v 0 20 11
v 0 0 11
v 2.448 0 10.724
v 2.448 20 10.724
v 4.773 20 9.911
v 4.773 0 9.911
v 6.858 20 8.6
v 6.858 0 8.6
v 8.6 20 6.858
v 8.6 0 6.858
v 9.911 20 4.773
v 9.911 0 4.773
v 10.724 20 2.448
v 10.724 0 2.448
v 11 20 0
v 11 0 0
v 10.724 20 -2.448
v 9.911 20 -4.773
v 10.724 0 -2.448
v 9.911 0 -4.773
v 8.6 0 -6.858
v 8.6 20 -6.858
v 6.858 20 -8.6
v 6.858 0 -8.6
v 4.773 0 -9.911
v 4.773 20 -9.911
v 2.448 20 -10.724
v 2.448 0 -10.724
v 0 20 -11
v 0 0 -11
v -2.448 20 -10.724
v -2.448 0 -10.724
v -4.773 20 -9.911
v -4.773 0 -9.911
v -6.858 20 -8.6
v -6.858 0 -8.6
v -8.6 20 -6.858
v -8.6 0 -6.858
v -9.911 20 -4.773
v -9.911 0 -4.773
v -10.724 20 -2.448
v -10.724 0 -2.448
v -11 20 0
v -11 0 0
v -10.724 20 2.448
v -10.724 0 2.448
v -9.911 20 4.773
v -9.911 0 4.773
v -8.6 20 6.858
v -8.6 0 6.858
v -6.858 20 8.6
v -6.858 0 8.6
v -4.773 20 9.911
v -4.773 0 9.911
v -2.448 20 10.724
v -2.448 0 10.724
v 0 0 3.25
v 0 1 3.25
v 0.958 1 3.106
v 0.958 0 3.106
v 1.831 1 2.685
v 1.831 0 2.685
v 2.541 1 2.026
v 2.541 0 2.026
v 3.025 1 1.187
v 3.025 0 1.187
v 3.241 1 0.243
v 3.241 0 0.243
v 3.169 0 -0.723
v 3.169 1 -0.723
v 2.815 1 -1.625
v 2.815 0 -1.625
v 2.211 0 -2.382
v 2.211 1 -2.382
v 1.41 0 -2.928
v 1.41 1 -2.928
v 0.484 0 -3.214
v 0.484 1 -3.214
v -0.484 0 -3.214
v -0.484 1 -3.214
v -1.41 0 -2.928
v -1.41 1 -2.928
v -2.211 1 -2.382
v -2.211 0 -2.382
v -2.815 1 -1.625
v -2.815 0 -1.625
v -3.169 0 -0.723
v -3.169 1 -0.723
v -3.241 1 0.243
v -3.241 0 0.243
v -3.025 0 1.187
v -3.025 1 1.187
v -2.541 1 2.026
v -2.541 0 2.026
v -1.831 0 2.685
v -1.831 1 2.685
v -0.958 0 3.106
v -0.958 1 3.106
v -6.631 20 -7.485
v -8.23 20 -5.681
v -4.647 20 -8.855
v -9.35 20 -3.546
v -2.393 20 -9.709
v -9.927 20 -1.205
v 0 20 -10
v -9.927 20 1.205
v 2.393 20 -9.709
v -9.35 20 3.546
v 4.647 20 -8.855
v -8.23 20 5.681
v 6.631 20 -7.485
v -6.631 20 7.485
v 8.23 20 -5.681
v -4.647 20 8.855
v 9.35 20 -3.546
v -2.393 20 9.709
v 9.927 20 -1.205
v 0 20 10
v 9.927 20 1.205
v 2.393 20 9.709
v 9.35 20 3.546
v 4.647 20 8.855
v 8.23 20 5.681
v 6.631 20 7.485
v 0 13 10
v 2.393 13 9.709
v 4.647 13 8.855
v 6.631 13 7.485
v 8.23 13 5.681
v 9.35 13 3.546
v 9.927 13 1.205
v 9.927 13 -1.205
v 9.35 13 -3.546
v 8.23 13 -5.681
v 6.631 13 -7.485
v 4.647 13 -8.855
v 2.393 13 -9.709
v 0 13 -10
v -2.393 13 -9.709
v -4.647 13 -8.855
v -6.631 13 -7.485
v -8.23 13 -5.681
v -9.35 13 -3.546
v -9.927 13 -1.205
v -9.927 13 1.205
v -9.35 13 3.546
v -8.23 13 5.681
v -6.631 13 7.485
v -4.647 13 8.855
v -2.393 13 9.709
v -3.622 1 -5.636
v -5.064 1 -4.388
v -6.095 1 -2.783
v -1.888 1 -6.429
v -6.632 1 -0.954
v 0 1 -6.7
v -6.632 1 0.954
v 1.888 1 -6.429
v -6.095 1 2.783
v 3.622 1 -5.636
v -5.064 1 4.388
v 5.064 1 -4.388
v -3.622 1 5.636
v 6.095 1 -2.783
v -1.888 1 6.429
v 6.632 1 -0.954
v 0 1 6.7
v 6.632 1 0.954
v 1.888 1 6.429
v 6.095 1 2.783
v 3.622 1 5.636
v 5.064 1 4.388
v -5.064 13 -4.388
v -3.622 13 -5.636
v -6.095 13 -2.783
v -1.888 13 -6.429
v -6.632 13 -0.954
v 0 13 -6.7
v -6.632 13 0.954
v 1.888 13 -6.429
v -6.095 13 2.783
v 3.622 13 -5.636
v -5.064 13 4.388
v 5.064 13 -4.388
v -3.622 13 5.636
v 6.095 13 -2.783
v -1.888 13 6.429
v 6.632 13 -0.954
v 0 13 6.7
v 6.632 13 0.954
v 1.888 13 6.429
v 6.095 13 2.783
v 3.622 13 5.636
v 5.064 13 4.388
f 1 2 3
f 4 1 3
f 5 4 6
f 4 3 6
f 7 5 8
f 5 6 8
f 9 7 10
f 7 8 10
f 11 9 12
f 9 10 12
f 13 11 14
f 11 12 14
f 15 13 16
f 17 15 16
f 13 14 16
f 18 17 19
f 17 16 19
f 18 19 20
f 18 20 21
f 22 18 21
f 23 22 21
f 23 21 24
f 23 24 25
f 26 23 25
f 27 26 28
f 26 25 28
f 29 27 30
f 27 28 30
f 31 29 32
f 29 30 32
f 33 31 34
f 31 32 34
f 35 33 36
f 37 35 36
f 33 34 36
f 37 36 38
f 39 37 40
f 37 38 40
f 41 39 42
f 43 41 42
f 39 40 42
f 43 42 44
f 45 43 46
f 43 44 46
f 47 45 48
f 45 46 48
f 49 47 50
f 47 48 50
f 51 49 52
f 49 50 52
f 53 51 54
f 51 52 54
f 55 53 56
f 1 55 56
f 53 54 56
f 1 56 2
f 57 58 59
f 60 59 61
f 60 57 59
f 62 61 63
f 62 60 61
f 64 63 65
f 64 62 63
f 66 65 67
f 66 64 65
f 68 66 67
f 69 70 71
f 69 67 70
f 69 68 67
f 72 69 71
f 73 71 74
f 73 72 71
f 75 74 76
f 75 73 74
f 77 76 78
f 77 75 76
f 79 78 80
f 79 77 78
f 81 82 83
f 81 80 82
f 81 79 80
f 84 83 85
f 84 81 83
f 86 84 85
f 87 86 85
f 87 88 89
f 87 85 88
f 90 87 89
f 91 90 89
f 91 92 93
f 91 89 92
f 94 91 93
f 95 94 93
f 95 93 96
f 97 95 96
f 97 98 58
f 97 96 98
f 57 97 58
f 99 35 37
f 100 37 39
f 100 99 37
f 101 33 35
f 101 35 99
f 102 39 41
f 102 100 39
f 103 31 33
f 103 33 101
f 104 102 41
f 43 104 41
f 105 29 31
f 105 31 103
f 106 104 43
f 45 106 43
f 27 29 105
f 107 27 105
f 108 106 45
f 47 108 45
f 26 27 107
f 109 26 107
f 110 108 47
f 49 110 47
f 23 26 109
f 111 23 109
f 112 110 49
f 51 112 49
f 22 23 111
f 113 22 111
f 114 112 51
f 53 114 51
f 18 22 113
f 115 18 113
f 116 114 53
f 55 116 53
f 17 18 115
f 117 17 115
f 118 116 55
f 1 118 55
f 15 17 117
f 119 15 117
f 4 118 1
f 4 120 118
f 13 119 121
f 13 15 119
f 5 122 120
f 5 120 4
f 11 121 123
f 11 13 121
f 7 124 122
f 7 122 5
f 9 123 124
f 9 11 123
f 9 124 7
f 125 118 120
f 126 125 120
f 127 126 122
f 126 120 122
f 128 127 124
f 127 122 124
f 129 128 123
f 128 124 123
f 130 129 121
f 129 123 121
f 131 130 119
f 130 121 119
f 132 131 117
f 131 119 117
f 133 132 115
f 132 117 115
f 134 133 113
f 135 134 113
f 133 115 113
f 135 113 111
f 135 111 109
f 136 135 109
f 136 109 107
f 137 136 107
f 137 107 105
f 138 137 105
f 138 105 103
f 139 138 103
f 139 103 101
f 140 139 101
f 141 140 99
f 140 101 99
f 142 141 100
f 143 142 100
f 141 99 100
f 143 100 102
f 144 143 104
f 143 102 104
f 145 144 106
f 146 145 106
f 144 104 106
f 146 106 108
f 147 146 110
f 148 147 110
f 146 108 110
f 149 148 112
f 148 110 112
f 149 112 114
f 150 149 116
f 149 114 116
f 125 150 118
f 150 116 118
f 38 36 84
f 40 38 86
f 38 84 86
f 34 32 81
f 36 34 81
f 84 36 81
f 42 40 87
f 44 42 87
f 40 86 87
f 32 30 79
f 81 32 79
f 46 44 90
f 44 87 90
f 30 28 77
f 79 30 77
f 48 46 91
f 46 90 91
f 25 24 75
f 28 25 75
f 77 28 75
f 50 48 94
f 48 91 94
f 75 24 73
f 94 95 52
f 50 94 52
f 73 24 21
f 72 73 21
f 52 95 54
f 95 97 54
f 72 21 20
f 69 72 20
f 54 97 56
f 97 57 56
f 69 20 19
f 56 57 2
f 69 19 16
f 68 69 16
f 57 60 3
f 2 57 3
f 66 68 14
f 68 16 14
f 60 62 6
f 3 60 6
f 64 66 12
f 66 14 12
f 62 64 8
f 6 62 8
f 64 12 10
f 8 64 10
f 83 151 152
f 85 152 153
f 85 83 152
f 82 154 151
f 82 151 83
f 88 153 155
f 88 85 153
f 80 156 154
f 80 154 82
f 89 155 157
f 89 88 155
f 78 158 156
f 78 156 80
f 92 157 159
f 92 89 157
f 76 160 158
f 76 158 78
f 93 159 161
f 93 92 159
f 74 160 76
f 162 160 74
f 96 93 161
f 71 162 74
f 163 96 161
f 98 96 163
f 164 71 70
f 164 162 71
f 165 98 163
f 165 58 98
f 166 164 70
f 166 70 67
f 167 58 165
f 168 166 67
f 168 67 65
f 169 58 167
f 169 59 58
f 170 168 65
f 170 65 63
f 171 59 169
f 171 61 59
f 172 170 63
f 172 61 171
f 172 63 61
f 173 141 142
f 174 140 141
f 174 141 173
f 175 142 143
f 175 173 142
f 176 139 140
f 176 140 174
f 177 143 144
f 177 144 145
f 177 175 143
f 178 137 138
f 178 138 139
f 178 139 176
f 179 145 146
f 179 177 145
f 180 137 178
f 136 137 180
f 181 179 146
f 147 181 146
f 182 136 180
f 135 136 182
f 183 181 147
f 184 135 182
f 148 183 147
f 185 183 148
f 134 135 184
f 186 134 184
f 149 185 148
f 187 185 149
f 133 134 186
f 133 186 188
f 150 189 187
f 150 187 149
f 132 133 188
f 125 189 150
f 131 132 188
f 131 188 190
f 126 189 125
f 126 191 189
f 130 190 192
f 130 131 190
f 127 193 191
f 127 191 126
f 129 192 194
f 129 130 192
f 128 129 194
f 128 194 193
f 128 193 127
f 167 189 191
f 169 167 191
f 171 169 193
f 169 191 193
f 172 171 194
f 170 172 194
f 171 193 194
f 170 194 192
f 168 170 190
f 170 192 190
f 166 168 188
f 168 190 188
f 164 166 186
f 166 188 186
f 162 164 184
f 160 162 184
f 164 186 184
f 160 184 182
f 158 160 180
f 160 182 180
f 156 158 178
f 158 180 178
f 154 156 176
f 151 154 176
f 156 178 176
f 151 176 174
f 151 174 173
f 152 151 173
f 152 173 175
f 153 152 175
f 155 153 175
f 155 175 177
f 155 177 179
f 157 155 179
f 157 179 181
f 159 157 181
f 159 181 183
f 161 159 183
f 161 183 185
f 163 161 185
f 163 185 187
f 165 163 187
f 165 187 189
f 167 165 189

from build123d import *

# Parameters (mm, degrees)
SKETCH1_R           = 11
BOSS_EXTRUDE1_DEPTH = 20
SKETCH2_R           = 3.25
CUT_EXTRUDE1_DEPTH  = 20
SKETCH3_R           = 6.7
CUT_EXTRUDE2_DEPTH  = 19
SKETCH5_R           = 10
CUT_EXTRUDE3_DEPTH  = 7


with BuildPart() as part:
    # Sketch1 → Boss-Extrude1 (new body)
    with BuildSketch(Plane(origin=(0, 0, 0), x_dir=(1, 0, 0), z_dir=(0, 1, 0))):
        with Locations(Location((0, 0, 0), (0, 0, 270))):
            Circle(SKETCH1_R)
    extrude(amount=BOSS_EXTRUDE1_DEPTH)

    # Sketch2 → Cut-Extrude1 (cut)
    with BuildSketch(Plane(origin=(0, 0, 0), x_dir=(1, 0, 0), z_dir=(0, 1, 0))):
        with Locations(Location((0, 0, 0), (0, 0, 270))):
            Circle(SKETCH2_R)
    extrude(amount=CUT_EXTRUDE1_DEPTH, mode=Mode.SUBTRACT)

    # Sketch3 → Cut-Extrude2 (cut)
    with BuildSketch(Plane(origin=(0, 20, 0), x_dir=(1, 0, 0), z_dir=(0, 1, 0))):
        with Locations(Location((0, 0, 0), (0, 0, 270))):
            Circle(SKETCH3_R)
    extrude(amount=-CUT_EXTRUDE2_DEPTH, mode=Mode.SUBTRACT)

    # Sketch5 → Cut-Extrude3 (cut)
    with BuildSketch(Plane(origin=(0, 20, 0), x_dir=(1, 0, 0), z_dir=(0, 1, 0))):
        with Locations(Location((0, 0, 0), (0, 0, 270))):
            Circle(SKETCH5_R)
    extrude(amount=-CUT_EXTRUDE3_DEPTH, mode=Mode.SUBTRACT)


solid = part.part
